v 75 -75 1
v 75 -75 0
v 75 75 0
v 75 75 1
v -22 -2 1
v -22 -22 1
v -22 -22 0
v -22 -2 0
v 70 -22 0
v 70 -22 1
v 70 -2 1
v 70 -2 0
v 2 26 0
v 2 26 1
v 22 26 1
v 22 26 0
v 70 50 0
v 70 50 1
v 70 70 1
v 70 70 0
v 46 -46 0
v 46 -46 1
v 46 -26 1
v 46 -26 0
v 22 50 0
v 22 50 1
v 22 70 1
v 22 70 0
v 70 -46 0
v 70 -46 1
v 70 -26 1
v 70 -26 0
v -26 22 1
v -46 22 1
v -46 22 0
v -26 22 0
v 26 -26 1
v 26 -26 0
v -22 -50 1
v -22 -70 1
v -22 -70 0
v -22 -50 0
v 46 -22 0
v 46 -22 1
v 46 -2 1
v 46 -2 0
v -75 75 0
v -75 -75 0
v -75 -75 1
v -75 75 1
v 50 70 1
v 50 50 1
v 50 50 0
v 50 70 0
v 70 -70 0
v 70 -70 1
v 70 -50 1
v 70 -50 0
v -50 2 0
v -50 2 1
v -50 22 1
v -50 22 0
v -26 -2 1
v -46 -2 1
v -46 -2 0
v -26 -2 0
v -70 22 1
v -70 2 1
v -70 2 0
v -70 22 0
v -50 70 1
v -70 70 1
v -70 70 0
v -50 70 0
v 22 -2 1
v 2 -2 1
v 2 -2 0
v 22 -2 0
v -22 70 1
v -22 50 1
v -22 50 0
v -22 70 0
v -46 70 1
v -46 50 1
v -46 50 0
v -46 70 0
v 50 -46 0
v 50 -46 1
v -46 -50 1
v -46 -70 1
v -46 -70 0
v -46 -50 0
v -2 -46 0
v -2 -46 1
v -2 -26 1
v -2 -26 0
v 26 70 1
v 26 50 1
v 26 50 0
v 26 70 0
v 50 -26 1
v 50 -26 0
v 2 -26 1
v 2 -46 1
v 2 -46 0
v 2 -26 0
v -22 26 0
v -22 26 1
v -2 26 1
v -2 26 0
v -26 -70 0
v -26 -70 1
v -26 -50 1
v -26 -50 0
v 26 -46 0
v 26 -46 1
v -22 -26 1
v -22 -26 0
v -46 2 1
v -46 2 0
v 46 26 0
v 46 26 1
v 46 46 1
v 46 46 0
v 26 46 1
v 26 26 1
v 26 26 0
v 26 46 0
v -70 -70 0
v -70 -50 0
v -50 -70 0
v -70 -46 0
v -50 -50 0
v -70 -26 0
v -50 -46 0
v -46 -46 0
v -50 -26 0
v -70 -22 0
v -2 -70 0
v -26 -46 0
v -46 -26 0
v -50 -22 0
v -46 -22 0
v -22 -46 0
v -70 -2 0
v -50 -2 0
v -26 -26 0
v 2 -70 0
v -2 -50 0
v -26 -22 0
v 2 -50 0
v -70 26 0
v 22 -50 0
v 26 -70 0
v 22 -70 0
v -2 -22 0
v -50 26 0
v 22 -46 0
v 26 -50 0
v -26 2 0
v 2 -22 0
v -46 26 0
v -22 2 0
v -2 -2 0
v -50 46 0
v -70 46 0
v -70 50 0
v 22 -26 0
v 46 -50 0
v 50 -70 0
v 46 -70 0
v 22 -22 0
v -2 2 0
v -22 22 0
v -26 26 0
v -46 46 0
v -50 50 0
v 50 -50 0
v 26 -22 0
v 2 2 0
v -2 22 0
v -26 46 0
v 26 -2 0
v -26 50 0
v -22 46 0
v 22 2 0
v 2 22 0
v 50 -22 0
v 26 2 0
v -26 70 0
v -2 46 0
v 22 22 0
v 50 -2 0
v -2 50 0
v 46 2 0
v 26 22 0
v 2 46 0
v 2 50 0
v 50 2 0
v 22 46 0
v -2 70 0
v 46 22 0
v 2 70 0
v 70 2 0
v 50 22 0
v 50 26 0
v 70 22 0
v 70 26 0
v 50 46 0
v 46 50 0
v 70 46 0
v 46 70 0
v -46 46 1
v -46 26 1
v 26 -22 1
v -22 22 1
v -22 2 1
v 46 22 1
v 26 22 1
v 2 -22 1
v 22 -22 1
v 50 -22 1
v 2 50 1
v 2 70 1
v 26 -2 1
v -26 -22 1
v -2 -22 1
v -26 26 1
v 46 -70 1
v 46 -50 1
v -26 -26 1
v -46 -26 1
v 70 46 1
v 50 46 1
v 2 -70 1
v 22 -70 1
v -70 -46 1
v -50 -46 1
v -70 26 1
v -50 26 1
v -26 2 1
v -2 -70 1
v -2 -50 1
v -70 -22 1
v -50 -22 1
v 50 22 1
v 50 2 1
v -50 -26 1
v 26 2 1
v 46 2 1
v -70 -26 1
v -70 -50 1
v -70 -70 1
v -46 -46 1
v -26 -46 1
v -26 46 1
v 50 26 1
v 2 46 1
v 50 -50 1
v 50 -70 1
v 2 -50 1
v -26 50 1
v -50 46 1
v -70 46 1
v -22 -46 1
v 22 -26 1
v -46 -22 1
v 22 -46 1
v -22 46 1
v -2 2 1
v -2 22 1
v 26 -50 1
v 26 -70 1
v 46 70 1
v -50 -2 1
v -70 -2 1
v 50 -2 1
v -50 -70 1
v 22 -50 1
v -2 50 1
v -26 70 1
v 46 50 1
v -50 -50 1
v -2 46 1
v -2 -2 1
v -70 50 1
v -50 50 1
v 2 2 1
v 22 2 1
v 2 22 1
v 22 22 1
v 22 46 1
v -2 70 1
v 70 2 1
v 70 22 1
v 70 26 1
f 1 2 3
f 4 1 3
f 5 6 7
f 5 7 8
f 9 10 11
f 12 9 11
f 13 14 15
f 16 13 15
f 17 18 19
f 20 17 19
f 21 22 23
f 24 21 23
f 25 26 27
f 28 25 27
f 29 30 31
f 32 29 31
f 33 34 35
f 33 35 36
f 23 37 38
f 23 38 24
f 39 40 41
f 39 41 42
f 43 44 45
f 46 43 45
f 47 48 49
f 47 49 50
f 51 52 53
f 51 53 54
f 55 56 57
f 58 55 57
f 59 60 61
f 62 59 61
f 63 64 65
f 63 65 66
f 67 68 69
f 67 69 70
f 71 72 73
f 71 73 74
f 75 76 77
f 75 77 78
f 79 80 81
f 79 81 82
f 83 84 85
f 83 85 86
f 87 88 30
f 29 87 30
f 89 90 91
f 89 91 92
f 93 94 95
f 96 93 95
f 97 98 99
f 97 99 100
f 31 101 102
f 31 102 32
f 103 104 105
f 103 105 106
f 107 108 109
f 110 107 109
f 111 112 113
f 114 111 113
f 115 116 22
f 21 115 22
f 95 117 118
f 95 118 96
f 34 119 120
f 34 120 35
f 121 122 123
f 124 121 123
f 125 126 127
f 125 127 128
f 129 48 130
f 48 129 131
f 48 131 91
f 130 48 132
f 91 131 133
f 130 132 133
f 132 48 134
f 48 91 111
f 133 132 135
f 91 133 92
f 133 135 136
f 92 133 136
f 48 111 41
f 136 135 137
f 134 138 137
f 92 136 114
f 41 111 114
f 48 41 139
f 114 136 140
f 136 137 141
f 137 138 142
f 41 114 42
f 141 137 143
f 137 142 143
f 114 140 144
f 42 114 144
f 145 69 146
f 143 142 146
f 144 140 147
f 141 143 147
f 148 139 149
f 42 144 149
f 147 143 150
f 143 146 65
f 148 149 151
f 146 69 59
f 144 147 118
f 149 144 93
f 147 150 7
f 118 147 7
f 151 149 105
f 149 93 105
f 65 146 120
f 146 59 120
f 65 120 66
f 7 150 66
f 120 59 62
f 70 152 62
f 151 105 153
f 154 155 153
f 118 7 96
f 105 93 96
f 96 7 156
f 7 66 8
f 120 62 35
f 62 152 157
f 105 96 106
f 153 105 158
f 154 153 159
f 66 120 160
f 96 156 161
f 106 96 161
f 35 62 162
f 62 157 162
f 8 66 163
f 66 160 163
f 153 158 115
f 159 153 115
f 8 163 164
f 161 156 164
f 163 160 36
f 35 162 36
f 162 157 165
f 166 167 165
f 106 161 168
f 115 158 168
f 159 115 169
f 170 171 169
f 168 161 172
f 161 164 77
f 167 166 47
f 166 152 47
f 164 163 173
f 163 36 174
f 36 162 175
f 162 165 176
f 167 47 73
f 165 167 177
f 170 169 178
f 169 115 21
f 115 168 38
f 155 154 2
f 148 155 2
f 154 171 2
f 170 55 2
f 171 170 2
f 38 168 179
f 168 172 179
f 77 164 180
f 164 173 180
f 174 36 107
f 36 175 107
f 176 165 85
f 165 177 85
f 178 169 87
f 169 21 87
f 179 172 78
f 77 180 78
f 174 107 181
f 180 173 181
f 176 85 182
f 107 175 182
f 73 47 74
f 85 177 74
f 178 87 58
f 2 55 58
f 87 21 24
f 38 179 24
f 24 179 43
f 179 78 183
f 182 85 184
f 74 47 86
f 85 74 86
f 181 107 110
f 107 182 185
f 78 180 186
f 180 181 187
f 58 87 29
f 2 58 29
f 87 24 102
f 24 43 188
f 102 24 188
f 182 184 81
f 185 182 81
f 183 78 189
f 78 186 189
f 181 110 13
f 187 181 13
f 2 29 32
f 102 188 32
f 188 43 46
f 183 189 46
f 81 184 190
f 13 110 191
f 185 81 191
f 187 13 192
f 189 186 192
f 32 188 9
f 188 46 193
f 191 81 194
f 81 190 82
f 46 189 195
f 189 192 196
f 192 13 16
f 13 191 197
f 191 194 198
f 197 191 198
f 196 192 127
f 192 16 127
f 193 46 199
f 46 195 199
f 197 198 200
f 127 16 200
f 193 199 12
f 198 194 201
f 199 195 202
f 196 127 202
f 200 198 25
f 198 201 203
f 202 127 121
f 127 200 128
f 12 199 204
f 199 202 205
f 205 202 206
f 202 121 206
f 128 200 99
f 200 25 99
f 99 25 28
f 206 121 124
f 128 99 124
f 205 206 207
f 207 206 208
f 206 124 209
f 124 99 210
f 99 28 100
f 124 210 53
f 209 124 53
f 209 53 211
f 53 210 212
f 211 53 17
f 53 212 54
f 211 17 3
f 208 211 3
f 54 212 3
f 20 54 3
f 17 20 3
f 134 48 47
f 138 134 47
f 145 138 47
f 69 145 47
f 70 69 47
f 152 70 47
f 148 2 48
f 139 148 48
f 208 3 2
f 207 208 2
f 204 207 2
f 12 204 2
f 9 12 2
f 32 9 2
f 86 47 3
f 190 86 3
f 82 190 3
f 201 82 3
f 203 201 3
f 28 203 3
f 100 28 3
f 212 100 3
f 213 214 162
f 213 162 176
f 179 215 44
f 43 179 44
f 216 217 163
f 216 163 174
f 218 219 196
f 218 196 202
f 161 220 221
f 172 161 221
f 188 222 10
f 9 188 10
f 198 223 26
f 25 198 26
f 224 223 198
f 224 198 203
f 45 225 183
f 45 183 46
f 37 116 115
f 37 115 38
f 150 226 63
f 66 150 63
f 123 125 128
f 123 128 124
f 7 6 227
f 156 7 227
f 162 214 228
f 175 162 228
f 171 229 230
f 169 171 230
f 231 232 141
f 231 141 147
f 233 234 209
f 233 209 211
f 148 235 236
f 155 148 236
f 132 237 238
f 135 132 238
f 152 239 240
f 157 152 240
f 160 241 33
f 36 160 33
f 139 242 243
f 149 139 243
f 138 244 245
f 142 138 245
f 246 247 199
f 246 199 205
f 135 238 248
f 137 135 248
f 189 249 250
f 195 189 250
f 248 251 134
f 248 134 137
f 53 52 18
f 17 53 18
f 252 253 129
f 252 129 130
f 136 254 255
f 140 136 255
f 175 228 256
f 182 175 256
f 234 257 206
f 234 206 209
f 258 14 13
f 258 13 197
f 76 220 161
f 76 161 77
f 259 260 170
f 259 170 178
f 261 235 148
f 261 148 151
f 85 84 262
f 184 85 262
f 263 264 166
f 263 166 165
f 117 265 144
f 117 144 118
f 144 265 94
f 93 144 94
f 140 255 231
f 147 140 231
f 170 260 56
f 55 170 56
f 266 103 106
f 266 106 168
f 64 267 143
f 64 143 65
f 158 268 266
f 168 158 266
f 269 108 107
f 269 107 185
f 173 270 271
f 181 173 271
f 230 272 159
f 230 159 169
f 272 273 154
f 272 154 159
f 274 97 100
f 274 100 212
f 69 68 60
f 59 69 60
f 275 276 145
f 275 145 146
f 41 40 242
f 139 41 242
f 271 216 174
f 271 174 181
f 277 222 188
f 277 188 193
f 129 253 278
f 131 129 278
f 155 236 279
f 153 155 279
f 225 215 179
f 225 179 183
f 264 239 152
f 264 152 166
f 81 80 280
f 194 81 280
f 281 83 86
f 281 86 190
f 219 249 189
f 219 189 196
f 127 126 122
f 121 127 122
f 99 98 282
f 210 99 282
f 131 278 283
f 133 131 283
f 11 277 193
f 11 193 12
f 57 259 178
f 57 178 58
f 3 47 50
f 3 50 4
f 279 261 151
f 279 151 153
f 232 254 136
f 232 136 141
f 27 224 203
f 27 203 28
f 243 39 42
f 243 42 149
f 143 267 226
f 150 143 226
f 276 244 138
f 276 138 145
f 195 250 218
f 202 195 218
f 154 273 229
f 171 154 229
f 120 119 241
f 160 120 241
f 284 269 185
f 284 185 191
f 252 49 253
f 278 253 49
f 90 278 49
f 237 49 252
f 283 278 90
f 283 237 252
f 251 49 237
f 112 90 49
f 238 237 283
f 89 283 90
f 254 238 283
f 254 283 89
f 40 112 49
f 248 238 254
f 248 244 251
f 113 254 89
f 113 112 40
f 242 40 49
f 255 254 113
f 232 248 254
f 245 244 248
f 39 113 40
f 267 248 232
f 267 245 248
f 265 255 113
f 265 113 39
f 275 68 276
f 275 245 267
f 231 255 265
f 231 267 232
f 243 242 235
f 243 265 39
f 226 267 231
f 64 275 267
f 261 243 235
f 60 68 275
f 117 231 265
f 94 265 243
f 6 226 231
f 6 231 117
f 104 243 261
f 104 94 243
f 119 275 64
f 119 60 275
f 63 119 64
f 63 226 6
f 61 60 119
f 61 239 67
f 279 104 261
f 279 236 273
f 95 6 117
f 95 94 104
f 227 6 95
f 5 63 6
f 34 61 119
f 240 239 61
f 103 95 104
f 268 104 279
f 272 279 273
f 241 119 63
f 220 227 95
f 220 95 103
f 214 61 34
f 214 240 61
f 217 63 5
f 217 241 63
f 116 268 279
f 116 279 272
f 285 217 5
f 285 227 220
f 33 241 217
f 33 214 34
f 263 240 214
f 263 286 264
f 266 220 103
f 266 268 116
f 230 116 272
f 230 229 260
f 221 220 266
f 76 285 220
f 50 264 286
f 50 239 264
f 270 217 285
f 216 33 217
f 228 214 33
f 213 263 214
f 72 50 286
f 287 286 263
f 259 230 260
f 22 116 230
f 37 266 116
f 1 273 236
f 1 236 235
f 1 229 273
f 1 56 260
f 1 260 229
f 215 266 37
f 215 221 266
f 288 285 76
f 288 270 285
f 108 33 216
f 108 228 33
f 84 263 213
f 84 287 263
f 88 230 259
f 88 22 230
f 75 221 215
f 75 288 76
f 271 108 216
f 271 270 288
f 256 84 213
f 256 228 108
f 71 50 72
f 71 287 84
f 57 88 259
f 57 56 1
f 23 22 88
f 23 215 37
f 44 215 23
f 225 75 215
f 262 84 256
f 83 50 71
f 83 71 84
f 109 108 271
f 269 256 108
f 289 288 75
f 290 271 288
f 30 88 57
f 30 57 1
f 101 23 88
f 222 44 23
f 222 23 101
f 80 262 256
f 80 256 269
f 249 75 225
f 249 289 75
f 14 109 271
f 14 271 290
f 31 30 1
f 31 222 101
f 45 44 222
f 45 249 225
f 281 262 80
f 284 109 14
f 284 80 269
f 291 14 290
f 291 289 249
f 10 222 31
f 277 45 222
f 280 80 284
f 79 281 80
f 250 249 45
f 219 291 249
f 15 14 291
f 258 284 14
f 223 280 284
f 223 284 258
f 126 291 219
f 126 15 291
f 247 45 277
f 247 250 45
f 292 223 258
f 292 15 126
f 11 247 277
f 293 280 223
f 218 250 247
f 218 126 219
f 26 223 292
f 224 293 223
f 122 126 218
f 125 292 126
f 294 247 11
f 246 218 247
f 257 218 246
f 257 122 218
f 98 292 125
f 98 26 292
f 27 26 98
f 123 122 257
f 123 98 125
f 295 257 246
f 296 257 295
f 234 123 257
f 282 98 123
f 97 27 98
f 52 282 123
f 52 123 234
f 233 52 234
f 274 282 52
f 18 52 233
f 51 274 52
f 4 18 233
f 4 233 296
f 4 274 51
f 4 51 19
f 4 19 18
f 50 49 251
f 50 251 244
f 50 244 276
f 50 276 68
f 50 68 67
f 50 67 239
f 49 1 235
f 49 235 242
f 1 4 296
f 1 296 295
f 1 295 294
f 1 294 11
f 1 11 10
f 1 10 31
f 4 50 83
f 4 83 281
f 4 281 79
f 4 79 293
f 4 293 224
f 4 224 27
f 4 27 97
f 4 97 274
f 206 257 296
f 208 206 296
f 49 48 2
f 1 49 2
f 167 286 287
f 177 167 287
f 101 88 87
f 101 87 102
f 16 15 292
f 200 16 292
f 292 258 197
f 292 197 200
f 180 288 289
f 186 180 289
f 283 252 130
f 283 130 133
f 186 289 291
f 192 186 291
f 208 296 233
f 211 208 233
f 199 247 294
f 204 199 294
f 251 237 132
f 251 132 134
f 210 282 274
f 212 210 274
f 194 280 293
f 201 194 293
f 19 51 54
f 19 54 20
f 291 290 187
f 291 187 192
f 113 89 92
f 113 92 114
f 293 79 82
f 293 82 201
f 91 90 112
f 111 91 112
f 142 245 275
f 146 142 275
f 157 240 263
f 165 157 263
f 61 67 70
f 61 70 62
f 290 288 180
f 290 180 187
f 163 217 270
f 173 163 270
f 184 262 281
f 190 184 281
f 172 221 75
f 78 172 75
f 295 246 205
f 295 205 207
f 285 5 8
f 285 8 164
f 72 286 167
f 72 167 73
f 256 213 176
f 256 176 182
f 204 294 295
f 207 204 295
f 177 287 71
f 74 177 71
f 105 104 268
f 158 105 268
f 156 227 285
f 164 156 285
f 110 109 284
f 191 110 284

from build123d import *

# Parameters (mm, degrees)
F0_W     = 150
F0_H     = 150
F1_DEPTH = 1
F2_W     = 20
F2_H     = 20
F3_DEPTH = 1.001


with BuildPart() as f1:
    # F0 (on Top) → F1 (new body)
    with BuildSketch(Plane.XY):
        Rectangle(F0_W, F0_H)
    extrude(amount=F1_DEPTH)

    # F2 (on face) → F3 (cut, through all)
    with BuildSketch(Plane.XY.offset(1)):
        with Locations((-60, 60)):
            Rectangle(F2_W, F2_H)
        with Locations((-36, 60)):
            Rectangle(F2_W, F2_H)
        with Locations((-12, 60)):
            Rectangle(F2_W, F2_H)
        with Locations((12, 60)):
            Rectangle(F2_W, F2_H)
        with Locations((36, 60)):
            Rectangle(F2_W, F2_H)
        with Locations((60, 60)):
            Rectangle(F2_W, F2_H)
        with Locations((12, 36)):
            Rectangle(F2_W, F2_H)
        with Locations((60, 36)):
            Rectangle(F2_W, F2_H)
        with Locations((-36, 36)):
            Rectangle(F2_W, F2_H)
        with Locations((-60, 36)):
            Rectangle(F2_W, F2_H)
        with Locations((-12, 36)):
            Rectangle(F2_W, F2_H)
        with Locations((36, 36)):
            Rectangle(F2_W, F2_H)
        with Locations((12, 12)):
            Rectangle(F2_W, F2_H)
        with Locations((60, 12)):
            Rectangle(F2_W, F2_H)
        with Locations((-36, 12)):
            Rectangle(F2_W, F2_H)
        with Locations((-60, 12)):
            Rectangle(F2_W, F2_H)
        with Locations((-12, 12)):
            Rectangle(F2_W, F2_H)
        with Locations((36, 12)):
            Rectangle(F2_W, F2_H)
        with Locations((12, -12)):
            Rectangle(F2_W, F2_H)
        with Locations((60, -12)):
            Rectangle(F2_W, F2_H)
        with Locations((-36, -12)):
            Rectangle(F2_W, F2_H)
        with Locations((-60, -12)):
            Rectangle(F2_W, F2_H)
        with Locations((-12, -12)):
            Rectangle(F2_W, F2_H)
        with Locations((36, -12)):
            Rectangle(F2_W, F2_H)
        with Locations((12, -36)):
            Rectangle(F2_W, F2_H)
        with Locations((60, -36)):
            Rectangle(F2_W, F2_H)
        with Locations((-36, -36)):
            Rectangle(F2_W, F2_H)
        with Locations((-60, -36)):
            Rectangle(F2_W, F2_H)
        with Locations((-12, -36)):
            Rectangle(F2_W, F2_H)
        with Locations((36, -36)):
            Rectangle(F2_W, F2_H)
        with Locations((12, -60)):
            Rectangle(F2_W, F2_H)
        with Locations((60, -60)):
            Rectangle(F2_W, F2_H)
        with Locations((-36, -60)):
            Rectangle(F2_W, F2_H)
        with Locations((-60, -60)):
            Rectangle(F2_W, F2_H)
        with Locations((-12, -60)):
            Rectangle(F2_W, F2_H)
        with Locations((36, -60)):
            Rectangle(F2_W, F2_H)
    extrude(amount=-F3_DEPTH, mode=Mode.SUBTRACT)


solid = f1.part
